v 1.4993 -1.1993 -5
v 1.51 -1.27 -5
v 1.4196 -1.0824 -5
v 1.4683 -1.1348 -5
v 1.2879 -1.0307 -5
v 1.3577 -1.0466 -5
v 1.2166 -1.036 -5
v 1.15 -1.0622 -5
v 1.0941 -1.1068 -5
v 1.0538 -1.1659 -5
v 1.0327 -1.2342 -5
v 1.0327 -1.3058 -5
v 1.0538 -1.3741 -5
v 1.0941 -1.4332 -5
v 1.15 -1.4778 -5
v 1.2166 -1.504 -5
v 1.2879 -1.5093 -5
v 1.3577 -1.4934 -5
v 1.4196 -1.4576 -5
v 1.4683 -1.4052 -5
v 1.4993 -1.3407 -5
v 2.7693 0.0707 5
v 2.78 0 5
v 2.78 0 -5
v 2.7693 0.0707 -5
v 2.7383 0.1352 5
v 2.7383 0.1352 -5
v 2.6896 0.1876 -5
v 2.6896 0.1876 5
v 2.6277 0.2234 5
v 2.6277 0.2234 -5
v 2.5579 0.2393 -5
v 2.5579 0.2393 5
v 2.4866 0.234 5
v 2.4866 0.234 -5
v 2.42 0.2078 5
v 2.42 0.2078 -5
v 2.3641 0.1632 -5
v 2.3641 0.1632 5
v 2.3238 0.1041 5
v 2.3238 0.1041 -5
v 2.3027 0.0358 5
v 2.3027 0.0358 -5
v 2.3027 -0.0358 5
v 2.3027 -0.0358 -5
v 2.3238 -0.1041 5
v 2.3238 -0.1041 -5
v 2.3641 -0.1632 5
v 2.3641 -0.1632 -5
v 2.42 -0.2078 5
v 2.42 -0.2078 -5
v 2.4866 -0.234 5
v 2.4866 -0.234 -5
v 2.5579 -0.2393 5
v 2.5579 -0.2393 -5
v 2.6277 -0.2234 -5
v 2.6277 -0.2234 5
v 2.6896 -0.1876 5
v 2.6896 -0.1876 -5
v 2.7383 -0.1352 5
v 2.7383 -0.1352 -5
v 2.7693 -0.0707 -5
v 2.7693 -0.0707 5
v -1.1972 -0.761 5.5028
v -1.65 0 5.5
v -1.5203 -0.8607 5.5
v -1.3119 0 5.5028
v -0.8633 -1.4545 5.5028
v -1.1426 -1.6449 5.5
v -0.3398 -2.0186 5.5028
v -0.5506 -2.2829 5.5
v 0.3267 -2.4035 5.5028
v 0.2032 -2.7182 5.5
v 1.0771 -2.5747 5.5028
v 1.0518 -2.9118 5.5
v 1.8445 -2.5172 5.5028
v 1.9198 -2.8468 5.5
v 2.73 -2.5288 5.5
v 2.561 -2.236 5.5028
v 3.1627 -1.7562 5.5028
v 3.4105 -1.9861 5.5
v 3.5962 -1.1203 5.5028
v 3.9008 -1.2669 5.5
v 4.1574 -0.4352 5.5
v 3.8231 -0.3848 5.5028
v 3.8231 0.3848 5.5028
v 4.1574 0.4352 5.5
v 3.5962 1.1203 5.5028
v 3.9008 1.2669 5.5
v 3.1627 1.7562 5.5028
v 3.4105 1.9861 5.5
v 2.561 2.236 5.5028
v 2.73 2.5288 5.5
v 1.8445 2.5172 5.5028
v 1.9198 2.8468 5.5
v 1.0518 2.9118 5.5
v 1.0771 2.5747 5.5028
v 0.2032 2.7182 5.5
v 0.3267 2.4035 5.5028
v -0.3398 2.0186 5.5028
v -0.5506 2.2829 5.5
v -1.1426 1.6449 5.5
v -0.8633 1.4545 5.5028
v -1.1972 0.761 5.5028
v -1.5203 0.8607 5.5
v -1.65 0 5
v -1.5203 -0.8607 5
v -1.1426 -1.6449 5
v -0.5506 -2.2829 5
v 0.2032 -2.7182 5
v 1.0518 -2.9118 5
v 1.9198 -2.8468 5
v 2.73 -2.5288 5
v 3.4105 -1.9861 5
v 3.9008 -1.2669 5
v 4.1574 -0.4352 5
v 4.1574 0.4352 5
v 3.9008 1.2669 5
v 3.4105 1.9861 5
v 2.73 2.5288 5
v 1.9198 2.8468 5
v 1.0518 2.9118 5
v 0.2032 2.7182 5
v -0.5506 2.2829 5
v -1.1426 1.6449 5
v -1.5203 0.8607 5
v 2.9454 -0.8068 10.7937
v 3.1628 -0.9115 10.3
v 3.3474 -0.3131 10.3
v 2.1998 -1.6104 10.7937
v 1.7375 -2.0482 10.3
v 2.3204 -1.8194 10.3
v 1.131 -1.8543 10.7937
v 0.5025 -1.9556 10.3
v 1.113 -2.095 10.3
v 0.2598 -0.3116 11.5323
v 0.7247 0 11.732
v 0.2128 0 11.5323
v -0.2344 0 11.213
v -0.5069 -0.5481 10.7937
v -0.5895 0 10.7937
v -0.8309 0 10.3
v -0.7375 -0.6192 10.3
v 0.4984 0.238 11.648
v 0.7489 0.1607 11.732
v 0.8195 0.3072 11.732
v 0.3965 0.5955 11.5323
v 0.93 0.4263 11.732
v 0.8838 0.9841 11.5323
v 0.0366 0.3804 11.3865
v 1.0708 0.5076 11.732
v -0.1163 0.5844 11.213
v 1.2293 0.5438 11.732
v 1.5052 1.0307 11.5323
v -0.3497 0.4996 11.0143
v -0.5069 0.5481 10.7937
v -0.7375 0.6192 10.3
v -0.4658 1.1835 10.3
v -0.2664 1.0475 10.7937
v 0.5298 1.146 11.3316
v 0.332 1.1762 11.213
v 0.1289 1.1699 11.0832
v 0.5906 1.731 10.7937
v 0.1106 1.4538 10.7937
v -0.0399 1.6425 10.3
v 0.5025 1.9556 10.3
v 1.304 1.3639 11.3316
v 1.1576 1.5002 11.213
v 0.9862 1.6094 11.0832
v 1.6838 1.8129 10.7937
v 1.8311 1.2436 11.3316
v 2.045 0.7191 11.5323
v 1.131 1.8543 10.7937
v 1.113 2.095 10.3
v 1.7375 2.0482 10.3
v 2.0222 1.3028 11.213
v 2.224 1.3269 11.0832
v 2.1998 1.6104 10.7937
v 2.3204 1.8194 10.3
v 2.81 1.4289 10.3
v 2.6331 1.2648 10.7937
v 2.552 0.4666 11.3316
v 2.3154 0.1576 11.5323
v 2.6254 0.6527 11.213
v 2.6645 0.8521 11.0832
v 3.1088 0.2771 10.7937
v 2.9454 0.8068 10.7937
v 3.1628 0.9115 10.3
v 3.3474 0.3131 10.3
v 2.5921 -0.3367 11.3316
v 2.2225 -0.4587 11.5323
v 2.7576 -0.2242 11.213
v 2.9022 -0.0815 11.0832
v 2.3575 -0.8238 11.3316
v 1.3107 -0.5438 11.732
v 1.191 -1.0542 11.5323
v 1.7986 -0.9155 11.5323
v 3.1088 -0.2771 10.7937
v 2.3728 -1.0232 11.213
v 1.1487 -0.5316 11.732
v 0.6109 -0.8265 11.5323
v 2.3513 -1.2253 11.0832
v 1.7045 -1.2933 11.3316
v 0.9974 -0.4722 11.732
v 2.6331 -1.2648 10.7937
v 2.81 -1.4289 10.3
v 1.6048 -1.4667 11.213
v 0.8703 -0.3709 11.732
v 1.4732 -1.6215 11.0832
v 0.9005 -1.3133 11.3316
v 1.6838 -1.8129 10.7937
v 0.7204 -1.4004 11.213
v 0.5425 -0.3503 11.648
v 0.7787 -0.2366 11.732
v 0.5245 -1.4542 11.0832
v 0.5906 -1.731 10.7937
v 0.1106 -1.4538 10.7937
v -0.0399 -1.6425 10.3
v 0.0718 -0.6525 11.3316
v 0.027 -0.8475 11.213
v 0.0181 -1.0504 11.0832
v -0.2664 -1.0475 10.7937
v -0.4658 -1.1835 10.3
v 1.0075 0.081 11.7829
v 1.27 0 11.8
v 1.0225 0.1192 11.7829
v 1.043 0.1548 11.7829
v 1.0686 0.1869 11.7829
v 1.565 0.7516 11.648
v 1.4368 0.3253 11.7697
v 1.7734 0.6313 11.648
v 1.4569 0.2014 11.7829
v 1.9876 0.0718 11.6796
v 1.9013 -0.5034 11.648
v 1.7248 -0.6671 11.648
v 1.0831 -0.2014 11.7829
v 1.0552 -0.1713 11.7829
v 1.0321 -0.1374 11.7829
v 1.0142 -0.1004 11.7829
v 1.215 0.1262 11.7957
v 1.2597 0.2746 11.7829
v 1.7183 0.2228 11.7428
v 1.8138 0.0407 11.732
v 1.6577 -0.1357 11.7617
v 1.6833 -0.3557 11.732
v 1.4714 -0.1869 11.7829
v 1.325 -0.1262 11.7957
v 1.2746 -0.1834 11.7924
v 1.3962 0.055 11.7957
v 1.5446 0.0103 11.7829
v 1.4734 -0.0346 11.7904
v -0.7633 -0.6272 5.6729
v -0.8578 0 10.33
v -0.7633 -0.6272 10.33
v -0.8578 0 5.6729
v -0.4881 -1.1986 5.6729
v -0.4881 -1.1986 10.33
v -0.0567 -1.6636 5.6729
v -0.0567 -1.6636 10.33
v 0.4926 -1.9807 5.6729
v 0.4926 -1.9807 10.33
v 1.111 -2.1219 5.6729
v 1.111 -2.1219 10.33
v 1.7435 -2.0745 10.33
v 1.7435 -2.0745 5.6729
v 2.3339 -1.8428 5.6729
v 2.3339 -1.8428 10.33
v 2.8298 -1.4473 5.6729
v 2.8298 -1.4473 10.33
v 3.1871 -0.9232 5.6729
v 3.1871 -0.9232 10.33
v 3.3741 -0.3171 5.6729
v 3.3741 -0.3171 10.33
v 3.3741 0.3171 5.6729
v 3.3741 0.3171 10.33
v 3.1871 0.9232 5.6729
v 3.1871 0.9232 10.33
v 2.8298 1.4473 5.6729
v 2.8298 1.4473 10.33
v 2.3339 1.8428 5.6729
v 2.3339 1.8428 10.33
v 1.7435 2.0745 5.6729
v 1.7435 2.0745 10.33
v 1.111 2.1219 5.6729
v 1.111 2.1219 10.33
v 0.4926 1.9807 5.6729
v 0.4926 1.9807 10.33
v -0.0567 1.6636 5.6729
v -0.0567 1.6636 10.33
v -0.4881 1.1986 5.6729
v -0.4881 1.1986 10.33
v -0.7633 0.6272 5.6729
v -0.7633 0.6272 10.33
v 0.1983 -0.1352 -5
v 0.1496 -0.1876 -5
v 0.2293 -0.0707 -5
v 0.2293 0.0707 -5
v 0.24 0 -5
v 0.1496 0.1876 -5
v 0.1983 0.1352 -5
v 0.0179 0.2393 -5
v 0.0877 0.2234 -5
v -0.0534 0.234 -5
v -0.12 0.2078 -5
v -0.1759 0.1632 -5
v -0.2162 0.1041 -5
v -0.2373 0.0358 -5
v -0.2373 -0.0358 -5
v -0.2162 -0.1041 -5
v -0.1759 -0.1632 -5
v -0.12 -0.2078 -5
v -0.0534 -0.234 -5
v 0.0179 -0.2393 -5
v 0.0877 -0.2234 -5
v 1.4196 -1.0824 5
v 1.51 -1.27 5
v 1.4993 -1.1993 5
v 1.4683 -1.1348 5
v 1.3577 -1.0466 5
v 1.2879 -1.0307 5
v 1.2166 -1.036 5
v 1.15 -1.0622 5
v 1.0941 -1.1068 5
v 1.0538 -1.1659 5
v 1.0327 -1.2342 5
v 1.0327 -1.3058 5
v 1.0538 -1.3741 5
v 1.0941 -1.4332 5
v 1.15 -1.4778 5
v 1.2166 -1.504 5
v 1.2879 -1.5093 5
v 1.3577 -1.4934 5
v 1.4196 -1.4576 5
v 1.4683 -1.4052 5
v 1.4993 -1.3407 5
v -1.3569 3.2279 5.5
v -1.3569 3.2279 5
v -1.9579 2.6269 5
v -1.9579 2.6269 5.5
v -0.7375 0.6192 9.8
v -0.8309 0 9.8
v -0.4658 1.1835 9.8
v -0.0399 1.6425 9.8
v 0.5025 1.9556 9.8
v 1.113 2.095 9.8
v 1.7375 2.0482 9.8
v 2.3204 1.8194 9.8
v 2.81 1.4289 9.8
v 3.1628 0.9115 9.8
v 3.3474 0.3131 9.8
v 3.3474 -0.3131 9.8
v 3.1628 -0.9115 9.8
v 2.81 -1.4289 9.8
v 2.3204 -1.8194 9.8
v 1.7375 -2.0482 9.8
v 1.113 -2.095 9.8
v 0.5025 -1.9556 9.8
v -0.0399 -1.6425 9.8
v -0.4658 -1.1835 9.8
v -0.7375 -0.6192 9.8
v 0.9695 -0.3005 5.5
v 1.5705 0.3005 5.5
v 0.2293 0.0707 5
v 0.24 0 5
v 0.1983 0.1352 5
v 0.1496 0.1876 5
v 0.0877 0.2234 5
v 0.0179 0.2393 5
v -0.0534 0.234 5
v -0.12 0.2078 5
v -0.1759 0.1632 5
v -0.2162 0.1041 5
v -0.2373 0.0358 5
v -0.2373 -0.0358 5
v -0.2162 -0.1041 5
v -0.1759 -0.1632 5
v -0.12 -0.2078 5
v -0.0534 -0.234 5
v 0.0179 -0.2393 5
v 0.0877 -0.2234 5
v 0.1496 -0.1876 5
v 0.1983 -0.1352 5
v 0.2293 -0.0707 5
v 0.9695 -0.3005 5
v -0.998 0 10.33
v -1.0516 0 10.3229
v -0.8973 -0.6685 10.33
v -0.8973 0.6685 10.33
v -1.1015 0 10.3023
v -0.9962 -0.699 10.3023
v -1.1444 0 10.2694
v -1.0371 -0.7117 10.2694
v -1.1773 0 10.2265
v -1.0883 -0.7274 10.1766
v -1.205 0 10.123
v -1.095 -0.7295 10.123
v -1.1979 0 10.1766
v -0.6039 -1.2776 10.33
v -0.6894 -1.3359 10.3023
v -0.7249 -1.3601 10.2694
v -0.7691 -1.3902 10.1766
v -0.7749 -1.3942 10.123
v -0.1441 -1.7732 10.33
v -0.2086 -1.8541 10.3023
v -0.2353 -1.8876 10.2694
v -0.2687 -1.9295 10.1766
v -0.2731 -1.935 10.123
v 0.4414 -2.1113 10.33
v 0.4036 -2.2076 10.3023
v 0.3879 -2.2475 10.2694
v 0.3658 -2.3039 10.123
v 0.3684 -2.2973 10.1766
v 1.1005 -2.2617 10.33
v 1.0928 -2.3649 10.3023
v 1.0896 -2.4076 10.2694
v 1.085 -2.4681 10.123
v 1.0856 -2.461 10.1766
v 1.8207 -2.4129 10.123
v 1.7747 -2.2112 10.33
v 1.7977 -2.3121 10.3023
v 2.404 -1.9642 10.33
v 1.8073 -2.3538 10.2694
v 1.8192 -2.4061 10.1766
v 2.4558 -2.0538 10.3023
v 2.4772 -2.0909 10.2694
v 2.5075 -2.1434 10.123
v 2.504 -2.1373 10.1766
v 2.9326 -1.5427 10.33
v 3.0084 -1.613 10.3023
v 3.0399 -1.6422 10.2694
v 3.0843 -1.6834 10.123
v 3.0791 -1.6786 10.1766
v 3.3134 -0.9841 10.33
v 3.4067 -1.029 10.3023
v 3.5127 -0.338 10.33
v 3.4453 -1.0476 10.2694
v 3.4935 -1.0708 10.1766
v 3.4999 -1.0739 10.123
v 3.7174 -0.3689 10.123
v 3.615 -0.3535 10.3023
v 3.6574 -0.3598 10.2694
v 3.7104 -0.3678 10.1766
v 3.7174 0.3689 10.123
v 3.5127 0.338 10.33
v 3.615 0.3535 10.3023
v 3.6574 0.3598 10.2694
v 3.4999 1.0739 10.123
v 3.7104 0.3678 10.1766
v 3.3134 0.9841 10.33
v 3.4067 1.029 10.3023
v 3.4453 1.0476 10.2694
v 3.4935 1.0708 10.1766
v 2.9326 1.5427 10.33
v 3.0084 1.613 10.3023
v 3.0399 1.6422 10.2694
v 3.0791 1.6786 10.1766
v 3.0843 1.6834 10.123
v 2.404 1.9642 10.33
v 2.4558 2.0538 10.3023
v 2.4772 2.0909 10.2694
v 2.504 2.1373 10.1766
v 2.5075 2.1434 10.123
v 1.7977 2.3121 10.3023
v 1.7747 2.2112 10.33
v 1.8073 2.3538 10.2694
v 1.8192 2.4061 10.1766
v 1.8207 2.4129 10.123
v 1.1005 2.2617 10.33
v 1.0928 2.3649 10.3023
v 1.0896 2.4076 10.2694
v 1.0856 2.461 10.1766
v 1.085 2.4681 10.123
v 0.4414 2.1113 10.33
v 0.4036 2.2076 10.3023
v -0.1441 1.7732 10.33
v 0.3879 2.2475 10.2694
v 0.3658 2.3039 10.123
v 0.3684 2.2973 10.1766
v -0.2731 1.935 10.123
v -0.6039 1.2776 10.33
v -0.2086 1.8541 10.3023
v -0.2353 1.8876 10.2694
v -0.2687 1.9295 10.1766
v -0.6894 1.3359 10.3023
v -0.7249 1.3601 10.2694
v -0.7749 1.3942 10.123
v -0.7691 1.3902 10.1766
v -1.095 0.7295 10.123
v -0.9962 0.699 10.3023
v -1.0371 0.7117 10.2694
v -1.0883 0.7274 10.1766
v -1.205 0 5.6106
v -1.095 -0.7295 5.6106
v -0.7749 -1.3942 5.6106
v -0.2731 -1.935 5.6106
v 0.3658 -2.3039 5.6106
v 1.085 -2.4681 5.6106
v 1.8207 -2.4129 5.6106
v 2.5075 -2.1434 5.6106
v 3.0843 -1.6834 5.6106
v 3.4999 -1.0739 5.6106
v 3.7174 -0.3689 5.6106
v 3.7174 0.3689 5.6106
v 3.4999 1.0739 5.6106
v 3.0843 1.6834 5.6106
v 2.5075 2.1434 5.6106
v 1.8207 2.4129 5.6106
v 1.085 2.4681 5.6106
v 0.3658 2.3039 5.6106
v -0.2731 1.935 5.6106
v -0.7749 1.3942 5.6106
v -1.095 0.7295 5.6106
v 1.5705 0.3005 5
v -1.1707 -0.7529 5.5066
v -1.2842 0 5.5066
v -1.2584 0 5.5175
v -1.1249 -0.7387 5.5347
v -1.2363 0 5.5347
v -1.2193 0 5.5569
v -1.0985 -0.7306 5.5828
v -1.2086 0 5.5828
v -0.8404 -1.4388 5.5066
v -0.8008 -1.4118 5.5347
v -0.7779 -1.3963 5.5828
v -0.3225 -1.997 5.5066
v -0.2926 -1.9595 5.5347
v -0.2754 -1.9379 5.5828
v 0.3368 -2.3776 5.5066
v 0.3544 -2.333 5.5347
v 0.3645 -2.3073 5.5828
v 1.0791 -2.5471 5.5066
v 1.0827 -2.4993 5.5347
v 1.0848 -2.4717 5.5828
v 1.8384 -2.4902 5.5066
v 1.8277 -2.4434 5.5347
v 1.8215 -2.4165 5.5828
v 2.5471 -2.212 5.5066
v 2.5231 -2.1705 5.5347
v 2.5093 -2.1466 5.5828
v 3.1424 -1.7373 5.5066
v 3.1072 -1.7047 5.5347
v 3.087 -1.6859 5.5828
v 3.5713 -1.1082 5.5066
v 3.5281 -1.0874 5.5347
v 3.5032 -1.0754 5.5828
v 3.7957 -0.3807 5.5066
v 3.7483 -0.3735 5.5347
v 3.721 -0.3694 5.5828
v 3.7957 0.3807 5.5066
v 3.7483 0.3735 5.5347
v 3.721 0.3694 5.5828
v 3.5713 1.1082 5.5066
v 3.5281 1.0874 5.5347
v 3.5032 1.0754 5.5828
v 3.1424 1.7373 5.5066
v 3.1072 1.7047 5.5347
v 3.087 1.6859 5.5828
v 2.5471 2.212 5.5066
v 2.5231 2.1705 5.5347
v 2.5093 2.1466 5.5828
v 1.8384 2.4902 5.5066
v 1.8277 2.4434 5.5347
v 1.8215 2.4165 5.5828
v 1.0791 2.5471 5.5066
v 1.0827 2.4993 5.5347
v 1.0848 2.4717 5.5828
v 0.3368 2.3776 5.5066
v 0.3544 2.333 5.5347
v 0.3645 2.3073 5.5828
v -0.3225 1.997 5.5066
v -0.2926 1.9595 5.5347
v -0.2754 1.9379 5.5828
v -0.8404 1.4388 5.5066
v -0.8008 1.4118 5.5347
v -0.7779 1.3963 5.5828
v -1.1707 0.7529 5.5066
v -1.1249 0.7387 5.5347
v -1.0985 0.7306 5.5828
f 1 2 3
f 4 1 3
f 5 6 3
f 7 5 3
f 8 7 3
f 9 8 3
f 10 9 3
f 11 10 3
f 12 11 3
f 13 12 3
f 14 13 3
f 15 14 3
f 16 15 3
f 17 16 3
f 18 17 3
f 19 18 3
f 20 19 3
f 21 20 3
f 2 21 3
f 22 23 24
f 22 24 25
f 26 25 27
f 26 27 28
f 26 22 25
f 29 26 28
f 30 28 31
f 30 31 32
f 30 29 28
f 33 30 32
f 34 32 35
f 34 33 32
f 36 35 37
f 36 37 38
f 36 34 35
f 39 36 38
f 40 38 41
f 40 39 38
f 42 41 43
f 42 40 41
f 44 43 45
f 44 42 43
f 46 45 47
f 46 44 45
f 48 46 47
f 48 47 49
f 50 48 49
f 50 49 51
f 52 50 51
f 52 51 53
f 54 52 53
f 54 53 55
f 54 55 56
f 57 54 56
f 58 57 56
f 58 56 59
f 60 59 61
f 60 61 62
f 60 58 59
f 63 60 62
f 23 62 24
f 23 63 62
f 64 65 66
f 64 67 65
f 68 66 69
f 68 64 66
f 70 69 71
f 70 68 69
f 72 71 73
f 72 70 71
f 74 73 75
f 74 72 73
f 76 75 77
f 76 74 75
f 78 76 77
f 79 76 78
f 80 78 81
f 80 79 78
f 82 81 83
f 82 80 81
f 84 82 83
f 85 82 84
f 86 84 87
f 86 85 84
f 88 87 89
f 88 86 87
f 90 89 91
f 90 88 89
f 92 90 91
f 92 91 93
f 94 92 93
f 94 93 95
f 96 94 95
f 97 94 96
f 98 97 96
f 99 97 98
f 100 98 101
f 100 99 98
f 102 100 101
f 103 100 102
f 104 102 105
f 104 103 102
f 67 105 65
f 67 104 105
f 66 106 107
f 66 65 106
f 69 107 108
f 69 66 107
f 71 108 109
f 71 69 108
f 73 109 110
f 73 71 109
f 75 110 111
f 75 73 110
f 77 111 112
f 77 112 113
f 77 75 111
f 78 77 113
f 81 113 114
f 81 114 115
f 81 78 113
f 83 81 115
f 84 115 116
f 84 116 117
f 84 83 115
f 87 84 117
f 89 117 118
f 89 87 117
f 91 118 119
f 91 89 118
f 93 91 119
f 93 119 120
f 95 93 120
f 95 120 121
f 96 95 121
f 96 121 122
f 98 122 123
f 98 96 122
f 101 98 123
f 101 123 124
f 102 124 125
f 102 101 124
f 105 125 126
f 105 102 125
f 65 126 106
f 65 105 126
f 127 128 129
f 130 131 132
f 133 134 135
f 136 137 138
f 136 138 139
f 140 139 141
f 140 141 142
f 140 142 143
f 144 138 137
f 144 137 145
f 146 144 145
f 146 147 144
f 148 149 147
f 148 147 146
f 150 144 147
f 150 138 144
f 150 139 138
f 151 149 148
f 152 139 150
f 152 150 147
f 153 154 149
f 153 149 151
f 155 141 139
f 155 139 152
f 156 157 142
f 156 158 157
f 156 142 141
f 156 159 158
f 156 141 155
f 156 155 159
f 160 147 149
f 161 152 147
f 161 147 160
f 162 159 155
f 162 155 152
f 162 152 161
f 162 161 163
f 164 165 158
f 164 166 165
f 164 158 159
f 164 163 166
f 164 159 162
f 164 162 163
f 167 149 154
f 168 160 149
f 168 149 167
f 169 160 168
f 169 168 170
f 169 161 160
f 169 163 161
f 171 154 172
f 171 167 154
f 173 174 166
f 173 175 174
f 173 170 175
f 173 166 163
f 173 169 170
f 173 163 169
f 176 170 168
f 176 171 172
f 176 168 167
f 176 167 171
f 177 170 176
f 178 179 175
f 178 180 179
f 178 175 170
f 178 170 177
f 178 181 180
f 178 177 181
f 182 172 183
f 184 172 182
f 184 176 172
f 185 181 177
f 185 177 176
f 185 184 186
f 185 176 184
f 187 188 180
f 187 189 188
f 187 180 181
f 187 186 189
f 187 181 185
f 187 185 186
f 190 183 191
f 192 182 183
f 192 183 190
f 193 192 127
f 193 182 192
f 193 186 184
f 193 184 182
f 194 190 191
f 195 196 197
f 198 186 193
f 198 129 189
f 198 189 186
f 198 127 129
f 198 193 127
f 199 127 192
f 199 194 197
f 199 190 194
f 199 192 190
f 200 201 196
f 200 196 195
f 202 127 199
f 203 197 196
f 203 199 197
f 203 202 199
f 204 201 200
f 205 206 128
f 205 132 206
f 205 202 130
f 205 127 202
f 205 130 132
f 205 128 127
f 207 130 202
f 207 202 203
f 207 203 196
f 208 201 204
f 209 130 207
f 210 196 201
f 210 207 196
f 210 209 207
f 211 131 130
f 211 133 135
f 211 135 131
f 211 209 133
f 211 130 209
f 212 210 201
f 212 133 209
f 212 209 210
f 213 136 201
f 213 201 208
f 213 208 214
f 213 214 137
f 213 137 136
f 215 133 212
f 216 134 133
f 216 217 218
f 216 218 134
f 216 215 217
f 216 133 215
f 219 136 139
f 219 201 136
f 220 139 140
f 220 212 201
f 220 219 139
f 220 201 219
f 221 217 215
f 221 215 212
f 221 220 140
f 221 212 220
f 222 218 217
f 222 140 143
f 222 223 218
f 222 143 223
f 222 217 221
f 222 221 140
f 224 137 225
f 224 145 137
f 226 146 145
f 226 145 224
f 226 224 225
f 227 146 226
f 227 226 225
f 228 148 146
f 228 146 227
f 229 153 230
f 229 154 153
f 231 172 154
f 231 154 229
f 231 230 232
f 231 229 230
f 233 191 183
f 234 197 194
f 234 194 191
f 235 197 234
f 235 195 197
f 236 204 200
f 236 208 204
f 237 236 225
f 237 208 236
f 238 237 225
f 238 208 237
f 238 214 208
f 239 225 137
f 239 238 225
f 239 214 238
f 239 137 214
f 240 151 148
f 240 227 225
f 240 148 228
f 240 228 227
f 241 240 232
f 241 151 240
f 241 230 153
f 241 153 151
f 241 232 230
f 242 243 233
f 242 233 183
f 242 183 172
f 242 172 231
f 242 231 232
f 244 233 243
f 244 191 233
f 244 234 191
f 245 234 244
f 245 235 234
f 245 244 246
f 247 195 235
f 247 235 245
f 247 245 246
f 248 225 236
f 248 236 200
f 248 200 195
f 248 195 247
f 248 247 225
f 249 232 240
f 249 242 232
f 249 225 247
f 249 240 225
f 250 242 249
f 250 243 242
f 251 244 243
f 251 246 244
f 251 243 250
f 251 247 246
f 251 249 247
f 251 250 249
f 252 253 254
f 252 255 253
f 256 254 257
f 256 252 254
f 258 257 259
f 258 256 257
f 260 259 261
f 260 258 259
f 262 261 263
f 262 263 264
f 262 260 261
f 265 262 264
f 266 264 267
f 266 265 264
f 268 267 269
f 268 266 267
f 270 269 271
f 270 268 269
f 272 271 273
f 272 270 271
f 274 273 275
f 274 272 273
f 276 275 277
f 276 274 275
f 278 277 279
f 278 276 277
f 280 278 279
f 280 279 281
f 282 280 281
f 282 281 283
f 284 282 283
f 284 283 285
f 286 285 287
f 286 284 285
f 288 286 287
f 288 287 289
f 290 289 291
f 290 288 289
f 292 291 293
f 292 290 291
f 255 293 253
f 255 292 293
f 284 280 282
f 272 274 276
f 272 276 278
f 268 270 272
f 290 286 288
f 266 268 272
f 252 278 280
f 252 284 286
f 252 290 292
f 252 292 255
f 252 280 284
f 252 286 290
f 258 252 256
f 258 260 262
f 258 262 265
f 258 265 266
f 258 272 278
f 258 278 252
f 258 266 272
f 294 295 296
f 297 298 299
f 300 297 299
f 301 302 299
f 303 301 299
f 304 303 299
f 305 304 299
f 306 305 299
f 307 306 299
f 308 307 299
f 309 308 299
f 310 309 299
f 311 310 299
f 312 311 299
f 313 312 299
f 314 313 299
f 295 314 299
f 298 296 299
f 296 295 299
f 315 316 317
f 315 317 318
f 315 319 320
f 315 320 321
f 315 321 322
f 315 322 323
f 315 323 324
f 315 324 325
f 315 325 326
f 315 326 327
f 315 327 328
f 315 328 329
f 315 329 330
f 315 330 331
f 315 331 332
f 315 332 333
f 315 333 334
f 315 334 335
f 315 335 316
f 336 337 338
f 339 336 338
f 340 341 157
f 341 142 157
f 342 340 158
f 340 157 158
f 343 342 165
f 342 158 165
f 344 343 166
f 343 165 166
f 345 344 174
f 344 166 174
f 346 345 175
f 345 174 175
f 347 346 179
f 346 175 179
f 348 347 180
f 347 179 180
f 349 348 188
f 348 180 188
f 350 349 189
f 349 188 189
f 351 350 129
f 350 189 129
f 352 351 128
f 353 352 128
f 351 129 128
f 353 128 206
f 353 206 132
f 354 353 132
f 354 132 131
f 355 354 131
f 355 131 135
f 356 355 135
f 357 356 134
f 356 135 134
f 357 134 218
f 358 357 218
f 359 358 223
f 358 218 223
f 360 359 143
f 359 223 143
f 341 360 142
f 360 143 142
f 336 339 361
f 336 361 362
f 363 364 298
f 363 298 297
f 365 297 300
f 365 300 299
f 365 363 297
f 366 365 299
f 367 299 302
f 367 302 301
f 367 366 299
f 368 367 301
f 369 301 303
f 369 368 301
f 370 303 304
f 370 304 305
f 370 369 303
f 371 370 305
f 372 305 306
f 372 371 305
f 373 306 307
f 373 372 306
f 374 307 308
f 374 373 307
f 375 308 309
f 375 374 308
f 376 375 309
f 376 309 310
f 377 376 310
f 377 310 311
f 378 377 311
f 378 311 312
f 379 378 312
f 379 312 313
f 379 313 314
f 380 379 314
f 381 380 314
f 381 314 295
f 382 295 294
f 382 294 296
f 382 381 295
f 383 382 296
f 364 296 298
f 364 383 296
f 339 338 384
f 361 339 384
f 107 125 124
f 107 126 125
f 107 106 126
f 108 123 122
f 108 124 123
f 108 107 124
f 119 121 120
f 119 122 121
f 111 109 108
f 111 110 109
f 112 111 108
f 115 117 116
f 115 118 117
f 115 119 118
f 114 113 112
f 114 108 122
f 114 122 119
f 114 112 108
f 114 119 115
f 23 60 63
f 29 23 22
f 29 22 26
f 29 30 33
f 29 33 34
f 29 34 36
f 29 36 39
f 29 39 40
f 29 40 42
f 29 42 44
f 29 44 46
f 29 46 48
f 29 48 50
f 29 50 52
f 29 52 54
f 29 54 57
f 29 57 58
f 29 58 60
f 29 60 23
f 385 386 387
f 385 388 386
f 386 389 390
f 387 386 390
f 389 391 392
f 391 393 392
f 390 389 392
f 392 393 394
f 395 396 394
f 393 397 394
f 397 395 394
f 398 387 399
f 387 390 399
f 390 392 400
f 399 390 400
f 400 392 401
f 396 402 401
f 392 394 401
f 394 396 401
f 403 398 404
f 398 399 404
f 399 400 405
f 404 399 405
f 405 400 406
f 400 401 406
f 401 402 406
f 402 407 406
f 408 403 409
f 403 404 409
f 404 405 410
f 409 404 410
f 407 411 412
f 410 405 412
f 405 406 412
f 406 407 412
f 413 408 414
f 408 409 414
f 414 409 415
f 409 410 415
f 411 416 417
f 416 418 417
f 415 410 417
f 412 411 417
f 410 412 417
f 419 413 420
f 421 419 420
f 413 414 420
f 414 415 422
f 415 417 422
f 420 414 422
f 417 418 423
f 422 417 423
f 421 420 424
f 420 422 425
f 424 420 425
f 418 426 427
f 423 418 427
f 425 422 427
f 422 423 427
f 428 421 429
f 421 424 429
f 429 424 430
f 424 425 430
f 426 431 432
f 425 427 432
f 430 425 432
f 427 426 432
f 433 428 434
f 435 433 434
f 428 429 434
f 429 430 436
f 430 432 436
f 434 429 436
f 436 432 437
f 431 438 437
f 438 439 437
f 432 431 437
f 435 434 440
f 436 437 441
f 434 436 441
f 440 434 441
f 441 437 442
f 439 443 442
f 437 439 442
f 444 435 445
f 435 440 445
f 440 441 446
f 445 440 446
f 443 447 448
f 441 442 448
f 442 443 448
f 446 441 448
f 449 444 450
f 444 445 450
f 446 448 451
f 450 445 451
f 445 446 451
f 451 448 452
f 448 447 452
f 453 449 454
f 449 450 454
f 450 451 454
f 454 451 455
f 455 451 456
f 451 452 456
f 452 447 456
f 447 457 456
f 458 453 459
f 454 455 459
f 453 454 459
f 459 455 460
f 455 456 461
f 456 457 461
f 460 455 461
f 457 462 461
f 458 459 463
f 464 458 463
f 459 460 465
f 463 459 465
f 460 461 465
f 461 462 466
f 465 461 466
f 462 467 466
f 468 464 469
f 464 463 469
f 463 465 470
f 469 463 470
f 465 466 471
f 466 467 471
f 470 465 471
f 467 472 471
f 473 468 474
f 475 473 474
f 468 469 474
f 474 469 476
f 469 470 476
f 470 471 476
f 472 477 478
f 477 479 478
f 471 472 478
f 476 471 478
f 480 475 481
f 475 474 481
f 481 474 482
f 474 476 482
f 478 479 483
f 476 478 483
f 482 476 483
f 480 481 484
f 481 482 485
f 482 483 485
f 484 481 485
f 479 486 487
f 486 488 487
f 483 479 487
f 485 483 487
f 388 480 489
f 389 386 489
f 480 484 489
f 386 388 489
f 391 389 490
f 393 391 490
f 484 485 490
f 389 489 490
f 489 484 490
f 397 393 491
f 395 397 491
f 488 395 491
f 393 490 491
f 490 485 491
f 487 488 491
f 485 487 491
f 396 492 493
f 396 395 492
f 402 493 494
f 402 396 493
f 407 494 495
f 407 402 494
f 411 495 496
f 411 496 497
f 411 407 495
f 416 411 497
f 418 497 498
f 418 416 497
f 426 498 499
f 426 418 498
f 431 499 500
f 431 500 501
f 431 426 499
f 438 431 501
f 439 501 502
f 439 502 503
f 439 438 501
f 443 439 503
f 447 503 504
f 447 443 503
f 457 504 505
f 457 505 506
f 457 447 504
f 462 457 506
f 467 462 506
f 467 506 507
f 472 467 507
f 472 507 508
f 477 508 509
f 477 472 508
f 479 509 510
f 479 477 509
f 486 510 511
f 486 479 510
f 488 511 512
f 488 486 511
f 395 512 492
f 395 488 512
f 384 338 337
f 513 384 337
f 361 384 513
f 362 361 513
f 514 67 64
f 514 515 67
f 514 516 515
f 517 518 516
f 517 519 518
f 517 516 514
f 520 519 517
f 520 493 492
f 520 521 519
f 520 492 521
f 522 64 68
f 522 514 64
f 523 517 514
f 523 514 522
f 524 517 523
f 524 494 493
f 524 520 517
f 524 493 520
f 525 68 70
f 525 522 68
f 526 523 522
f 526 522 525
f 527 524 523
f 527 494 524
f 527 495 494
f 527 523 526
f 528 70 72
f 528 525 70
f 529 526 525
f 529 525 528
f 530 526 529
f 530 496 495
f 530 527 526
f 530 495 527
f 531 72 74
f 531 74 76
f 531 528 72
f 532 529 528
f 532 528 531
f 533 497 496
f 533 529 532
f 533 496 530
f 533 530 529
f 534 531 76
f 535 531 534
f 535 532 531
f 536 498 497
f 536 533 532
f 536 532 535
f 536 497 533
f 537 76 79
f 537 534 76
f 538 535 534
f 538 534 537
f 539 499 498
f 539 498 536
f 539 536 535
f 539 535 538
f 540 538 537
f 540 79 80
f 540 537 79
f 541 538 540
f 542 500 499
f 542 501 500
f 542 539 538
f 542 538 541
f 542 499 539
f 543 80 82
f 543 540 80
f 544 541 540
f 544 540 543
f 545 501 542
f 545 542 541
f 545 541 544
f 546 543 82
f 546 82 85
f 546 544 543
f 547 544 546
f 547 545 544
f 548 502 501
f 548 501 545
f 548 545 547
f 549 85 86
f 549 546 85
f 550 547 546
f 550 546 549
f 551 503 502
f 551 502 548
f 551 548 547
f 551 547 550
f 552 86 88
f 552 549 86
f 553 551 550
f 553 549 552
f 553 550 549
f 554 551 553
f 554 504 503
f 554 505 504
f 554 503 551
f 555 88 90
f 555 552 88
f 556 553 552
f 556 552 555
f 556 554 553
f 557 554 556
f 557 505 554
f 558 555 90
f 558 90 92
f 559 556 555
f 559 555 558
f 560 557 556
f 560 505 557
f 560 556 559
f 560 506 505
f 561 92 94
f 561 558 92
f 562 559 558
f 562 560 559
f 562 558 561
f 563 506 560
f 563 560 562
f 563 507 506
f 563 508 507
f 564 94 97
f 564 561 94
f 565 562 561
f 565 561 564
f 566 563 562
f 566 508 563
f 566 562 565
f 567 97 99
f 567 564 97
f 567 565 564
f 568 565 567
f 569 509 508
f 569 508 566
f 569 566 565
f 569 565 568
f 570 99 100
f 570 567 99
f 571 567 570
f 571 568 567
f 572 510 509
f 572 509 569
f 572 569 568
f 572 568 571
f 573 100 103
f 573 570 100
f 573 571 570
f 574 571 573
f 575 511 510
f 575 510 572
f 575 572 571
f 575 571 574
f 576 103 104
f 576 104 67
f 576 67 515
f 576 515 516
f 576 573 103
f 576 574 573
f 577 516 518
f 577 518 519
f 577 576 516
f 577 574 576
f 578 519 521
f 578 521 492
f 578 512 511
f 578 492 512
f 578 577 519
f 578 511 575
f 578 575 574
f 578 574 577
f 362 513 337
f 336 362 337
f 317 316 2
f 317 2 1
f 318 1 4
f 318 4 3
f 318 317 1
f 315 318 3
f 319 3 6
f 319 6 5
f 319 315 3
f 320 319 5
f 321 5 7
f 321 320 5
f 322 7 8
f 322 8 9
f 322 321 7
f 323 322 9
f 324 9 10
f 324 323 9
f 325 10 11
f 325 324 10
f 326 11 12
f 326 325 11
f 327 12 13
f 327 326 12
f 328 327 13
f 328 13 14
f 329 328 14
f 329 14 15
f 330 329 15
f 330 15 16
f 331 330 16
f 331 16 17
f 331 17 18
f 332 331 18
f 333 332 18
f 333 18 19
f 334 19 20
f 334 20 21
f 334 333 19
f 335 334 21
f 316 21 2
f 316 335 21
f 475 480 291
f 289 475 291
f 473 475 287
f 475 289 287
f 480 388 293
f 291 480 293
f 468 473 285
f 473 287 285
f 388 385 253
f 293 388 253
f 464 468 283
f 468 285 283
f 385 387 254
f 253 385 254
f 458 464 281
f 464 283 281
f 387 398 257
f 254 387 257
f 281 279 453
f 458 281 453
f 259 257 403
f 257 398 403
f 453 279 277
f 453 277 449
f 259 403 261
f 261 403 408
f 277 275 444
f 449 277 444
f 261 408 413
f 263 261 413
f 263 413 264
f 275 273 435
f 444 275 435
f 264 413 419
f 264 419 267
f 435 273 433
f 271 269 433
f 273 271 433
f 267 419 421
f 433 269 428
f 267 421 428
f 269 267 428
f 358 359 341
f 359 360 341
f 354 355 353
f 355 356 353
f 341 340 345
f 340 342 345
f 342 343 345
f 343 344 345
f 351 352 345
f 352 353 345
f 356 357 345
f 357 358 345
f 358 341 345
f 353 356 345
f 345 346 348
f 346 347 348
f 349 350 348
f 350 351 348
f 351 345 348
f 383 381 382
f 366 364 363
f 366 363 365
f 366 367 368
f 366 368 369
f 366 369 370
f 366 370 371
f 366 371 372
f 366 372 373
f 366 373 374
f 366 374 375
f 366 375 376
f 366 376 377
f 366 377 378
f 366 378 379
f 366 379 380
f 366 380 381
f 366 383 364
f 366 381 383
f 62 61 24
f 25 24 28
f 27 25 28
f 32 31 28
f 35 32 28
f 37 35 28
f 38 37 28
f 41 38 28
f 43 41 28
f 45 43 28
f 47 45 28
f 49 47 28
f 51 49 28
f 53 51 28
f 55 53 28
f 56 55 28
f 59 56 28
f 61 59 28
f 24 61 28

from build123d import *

# Parameters (mm, degrees)
SKETCH_R     = 0.24
PAD_DEPTH    = 10
SKETCH001_R  = 0.24
PAD002_DEPTH = 10
PAD003_DEPTH = 0.5
SKETCH005_R  = 0.24
PAD004_DEPTH = 10


with BuildPart() as pad:
    # Sketch → Pad (new body)
    with BuildSketch(Plane.XY.offset(5)):
        Circle(SKETCH_R)
    extrude(amount=-PAD_DEPTH)


with BuildPart() as pad002:
    # Sketch001 → Pad002 (new body)
    with BuildSketch(Plane.XY.offset(5)):
        with Locations((2.54, 0)):
            Circle(SKETCH001_R)
    extrude(amount=-PAD002_DEPTH)


with BuildPart() as revolution:
    # Sketch003 → Revolution (revolve)
    with BuildSketch(Plane.XZ):
        with BuildLine():
            Line((1.27, 5), (-1.65, 5))
            Line((-1.65, 5), (-1.65, 5.5))
            Line((-1.65, 5.5), (-1.311931, 5.502782))
            ThreePointArc((-1.311931, 5.502782), (-1.236266, 5.534671), (-1.205, 5.610596))
            Line((-1.205, 5.610596), (-1.205, 10.123031))
            ThreePointArc((-0.998031, 10.33), (-1.14438, 10.26938), (-1.205, 10.123031))
            Line((-0.857826, 10.33), (-0.998031, 10.33))
            Line((-0.857826, 10.33), (-0.857826, 5.672898))
            Line((-0.857826, 5.672898), (1.27, 5.672898))
            Line((1.27, 5.672898), (1.27, 5))
        make_face()
    revolve(axis=Axis((1.27, 0, 2.550668), (0, 0, 1)))


with BuildPart() as pad003:
    # Sketch004 → Pad003 (new body)
    with BuildSketch(Plane.XY.offset(5)):
        Polygon((1.57052, 0.30052), (-1.356902, 3.227942), (-1.957942, 2.626902), (0.96948, -0.30052), align=None)
    extrude(amount=PAD003_DEPTH)


with BuildPart() as pad004:
    # Sketch005 → Pad004 (new body)
    with BuildSketch(Plane.XY.offset(5)):
        with Locations((1.27, -1.27)):
            Circle(SKETCH005_R)
    extrude(amount=-PAD004_DEPTH)


with BuildPart() as revolution001:
    # Sketch006 → Revolution001 (revolve)
    with BuildSketch(Plane.XZ):
        with BuildLine():
            ThreePointArc((1.27, 11.8), (-0.020699, 11.386514), (-0.83086, 10.3))
            Line((-0.83086, 9.8), (-0.83086, 10.3))
            Line((1.27, 9.8), (-0.83086, 9.8))
            Line((1.27, 11.8), (1.27, 9.8))
        make_face()
    revolve(axis=Axis((1.27, 0, 10.454185), (0, 0, -1)))


solid = Compound([pad.part, pad002.part, revolution.part, pad003.part, pad004.part, revolution001.part])
